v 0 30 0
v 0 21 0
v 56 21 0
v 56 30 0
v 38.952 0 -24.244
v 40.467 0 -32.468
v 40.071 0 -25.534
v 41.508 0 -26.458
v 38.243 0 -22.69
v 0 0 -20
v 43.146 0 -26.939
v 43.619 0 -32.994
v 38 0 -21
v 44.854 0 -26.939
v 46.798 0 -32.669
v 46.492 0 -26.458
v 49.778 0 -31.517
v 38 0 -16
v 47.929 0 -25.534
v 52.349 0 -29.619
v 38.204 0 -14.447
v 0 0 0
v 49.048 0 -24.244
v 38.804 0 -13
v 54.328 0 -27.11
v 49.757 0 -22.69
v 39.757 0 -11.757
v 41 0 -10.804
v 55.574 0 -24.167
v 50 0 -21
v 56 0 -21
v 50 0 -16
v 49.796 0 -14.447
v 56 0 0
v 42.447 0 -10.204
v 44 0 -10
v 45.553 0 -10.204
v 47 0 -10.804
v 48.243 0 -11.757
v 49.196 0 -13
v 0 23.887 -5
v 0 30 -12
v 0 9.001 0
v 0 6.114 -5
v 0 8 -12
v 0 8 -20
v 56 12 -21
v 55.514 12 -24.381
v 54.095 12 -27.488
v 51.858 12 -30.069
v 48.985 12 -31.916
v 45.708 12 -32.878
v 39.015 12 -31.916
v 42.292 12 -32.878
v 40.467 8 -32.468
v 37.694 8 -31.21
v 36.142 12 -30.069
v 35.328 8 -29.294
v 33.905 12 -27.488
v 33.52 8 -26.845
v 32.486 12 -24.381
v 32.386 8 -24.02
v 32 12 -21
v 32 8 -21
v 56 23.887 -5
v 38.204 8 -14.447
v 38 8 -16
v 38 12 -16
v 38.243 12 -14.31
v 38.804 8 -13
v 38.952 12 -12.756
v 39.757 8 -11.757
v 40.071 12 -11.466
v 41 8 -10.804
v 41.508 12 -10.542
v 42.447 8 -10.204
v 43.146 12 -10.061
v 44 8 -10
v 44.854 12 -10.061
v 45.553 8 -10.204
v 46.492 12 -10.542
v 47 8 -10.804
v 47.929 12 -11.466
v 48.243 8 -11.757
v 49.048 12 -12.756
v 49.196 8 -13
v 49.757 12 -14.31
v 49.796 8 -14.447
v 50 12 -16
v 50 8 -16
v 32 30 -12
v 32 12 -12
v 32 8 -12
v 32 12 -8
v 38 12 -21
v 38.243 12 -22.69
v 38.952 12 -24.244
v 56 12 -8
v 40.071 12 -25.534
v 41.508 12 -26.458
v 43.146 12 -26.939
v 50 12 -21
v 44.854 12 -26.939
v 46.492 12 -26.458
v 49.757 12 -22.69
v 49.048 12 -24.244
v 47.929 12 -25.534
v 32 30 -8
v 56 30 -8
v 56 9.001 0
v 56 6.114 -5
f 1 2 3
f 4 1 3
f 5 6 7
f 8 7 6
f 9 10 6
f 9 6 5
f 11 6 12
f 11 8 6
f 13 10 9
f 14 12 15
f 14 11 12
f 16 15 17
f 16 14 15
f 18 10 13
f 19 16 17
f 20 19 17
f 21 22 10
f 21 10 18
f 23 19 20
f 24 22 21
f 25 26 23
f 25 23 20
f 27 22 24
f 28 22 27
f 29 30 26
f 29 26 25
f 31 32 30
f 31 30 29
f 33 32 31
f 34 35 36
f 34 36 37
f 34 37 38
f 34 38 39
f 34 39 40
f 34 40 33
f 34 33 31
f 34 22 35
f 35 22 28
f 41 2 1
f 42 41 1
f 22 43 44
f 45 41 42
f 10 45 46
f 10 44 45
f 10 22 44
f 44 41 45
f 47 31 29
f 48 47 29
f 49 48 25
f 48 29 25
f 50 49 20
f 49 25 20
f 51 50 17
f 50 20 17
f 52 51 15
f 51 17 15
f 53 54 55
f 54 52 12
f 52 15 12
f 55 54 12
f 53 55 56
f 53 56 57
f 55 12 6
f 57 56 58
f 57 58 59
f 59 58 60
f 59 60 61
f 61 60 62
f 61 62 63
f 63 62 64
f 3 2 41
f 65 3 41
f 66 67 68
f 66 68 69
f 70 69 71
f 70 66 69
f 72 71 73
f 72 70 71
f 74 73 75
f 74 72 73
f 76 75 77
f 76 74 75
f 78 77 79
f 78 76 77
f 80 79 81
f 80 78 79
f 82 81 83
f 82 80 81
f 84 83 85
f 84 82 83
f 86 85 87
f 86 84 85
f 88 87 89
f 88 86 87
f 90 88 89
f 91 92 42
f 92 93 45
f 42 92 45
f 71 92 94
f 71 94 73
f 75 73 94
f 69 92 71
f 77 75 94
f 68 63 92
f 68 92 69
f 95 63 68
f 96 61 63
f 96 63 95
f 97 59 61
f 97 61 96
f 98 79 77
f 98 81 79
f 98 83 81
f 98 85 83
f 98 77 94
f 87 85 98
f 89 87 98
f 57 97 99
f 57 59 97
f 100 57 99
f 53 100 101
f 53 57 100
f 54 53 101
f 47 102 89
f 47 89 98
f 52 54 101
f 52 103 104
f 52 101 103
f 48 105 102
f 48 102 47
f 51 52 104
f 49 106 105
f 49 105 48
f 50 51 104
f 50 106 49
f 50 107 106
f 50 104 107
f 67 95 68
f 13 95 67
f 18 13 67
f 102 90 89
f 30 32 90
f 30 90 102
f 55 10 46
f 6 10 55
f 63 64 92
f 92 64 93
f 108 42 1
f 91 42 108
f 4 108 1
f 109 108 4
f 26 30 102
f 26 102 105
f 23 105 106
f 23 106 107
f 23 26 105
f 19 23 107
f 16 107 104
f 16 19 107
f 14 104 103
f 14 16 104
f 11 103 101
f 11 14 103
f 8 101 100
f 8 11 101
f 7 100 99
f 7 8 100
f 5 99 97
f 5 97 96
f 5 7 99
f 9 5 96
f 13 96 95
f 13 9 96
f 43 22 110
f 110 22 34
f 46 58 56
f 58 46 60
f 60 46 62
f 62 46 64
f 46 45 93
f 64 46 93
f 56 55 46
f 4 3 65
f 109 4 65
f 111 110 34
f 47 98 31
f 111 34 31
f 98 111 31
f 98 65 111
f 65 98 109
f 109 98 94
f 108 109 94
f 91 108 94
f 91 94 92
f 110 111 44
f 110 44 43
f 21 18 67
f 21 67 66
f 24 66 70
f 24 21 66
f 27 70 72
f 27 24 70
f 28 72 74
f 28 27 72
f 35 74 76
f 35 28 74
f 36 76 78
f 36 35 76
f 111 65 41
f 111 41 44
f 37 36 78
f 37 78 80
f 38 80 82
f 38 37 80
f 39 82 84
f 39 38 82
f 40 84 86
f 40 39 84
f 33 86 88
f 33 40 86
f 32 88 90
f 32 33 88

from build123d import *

# Parameters (mm, degrees)
EXTRUDE_1_DEPTH          = 30
CUT_EXTRUDE_1_DEPTH      = 65.652919501
CUT_EXTRUDE_1_DEPTH_BACK = 65.652919501
EXTRUDE_2_DEPTH          = 8
EXTRUDE_3_DEPTH          = 4


with BuildPart() as part:
    # 草图1 → 凸台-拉伸1 (new body)
    with BuildSketch(Plane(origin=(0, 0, 0), x_dir=(1, 0, 0), z_dir=(0, 1, 0))):
        Polygon((0, 0), (56, 0), (56, 8), (32, 8), (32, 12), (0, 12), align=None)
    extrude(amount=EXTRUDE_1_DEPTH)

    # 草图2 → 切除-拉伸1 (cut, two sides: drawn at the far end of the back side and taken through both)
    with BuildSketch(Plane.ZY.offset(-CUT_EXTRUDE_1_DEPTH_BACK)):
        Polygon((0, 15), (0, 15.000747226), (0, 21), (-5, 23.886751346), (-5, 6.11399588), (0, 9.000747226), align=None)
    extrude(amount=CUT_EXTRUDE_1_DEPTH + CUT_EXTRUDE_1_DEPTH_BACK, mode=Mode.SUBTRACT)

    # 草图5 → 凸台-拉伸2 (add)
    with BuildSketch(Plane.XZ):
        with BuildLine():
            Line((56, -8), (44, -8))
            Line((44, -8), (32, -8))
            Line((32, -8), (32, -12))
            Line((32, -12), (0, -12))
            Line((0, -12), (0, -20))
            Line((0, -20), (40.466636051, -32.468013743))
            ThreePointArc((40.466636051, -32.468013743), (51.127398986, -30.654024223), (56, -21))
            Line((56, -21), (56, -8))
        make_face()
        with BuildLine():
            ThreePointArc((38, -16), (39.757359313, -11.757359313), (44, -10))
            ThreePointArc((44, -10), (48.242640687, -11.757359313), (50, -16))
            Line((50, -16), (50, -21))
            ThreePointArc((50, -21), (44, -27), (38, -21))
            Line((38, -21), (38, -16))
        make_face(mode=Mode.SUBTRACT)
    extrude(amount=-EXTRUDE_2_DEPTH)

    # 草图6 → 凸台-拉伸3 (add)
    with BuildSketch(Plane(origin=(0, 8, 0), x_dir=(1, 0, 0), z_dir=(0, 1, 0))):
        with BuildLine():
            Line((32, 21), (32, 8))
            Line((32, 8), (56, 8))
            Line((56, 8), (56, 21))
            ThreePointArc((56, 21), (44, 33), (32, 21))
        make_face()
        with BuildLine():
            Line((38, 21), (38, 16))
            ThreePointArc((38, 16), (44, 10), (50, 16))
            Line((50, 16), (50, 21))
            ThreePointArc((50, 21), (44, 27), (38, 21))
        make_face(mode=Mode.SUBTRACT)
    extrude(amount=EXTRUDE_3_DEPTH)


solid = part.part
